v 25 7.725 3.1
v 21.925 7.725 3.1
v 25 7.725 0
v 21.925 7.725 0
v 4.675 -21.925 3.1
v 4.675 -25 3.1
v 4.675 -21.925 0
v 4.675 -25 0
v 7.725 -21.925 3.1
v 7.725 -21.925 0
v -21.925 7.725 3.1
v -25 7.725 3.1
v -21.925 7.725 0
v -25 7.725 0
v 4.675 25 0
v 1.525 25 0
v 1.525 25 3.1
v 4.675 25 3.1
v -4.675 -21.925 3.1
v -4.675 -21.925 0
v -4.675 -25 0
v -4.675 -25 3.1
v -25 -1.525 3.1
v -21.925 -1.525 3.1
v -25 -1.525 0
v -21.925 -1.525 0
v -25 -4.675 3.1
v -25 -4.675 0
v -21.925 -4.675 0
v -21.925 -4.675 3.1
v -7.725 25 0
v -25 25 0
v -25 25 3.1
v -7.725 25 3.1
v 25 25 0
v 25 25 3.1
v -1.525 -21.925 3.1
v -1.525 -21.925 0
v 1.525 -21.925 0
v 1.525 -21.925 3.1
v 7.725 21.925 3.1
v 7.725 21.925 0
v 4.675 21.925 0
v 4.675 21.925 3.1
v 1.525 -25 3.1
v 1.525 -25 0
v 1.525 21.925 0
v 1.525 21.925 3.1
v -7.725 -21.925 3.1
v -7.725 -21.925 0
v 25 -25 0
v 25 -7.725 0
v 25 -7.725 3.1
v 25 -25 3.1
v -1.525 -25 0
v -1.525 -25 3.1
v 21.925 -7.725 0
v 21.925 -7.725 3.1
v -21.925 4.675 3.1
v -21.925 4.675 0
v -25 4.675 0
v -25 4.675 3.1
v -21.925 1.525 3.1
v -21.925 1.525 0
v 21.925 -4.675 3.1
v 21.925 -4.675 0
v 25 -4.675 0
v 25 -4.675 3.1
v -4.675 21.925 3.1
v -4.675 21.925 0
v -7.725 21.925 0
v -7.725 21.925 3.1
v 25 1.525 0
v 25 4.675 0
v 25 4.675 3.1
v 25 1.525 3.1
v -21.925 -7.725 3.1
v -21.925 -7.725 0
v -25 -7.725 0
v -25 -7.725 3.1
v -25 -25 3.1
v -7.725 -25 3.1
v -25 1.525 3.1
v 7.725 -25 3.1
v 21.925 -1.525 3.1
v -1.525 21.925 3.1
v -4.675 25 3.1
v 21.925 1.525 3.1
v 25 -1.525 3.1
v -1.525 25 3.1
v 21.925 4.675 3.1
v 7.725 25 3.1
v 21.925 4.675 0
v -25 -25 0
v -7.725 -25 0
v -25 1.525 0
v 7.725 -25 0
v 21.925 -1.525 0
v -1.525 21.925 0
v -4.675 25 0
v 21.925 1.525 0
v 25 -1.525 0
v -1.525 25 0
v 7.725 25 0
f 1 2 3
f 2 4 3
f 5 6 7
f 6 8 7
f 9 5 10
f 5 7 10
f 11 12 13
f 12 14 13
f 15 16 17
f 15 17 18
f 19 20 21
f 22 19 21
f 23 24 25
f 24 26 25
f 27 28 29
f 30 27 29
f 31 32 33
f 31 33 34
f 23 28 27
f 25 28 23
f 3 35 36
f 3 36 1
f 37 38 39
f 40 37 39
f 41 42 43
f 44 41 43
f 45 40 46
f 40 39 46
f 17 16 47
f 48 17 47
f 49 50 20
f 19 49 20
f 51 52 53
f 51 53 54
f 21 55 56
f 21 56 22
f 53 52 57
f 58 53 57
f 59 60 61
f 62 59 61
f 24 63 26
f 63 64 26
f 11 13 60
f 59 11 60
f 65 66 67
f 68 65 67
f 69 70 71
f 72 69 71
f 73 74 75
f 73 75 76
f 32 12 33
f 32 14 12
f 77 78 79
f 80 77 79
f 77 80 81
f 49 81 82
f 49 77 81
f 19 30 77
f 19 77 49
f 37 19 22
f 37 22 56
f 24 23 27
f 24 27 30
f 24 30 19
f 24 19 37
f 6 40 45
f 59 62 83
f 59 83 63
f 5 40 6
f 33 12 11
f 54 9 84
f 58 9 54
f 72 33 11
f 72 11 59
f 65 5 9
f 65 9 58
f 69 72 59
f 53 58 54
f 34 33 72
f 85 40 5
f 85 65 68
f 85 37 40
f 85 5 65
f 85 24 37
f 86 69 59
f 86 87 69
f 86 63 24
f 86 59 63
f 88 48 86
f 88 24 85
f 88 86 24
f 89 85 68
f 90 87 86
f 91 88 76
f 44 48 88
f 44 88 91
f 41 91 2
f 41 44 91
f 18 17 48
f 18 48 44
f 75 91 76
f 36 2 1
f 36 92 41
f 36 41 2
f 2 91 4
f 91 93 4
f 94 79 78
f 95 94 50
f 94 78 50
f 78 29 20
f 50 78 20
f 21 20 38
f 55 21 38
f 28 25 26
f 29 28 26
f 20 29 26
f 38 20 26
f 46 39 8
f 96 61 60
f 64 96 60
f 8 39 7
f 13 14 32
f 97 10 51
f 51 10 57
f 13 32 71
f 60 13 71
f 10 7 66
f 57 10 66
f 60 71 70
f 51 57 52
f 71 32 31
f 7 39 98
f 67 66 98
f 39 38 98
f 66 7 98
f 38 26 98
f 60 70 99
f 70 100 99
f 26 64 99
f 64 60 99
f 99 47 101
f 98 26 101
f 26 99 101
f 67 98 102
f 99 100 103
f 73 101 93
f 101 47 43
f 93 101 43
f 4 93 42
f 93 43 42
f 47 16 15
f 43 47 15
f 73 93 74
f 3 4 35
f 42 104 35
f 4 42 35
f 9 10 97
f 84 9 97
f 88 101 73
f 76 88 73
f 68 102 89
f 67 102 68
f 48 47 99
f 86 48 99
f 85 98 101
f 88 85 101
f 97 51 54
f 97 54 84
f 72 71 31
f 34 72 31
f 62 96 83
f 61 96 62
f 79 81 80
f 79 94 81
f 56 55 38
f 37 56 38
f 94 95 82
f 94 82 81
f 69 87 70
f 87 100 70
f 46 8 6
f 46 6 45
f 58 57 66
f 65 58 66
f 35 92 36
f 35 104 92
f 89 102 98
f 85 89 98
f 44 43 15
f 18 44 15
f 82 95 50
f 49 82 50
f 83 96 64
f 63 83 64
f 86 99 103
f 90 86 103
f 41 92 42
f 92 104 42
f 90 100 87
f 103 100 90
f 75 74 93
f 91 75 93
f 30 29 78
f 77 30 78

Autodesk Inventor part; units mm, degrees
ref_plane "YZ Plane" through (0, 0, 0) normal (1, 0, 0) x (0, 1, 0)
ref_plane "XZ Plane" through (0, 0, 0) normal (0, 1, 0) x (-1, 0, 0)
ref_plane "XY Plane" through (0, 0, 0) normal (0, 0, 1) x (1, 0, 0)
sketch "slots" plane through (0, 0, 0) normal (0, 0, 1) x (1, 0, 0)
  line L0 (61.2067, 31.1821) -> (64.2567, 31.1821)
  line L1 (64.2567, 31.1821) -> (64.2567, 28.1071)
  line L2 (64.2567, 28.1071) -> (61.2067, 28.1071)
  line L3 (61.2067, 28.1071) -> (61.2067, 31.1821)
  line L4 (68.9317, 33.8834) -> (68.9317, 26.9198) construction
  line L5 (67.4067, 31.1821) -> (70.4567, 31.1821)
  line L6 (70.4567, 31.1821) -> (70.4567, 28.1071)
  line L7 (70.4567, 28.1071) -> (67.4067, 28.1071)
  line L8 (67.4067, 28.1071) -> (67.4067, 31.1821)
  line L9 (73.6067, 31.1821) -> (76.6567, 31.1821)
  line L10 (76.6567, 31.1821) -> (76.6567, 28.1071)
  line L11 (76.6567, 28.1071) -> (73.6067, 28.1071)
  line L12 (73.6067, 28.1071) -> (73.6067, 31.1821)
  line L13 (68.9317, 28.1071) -> (68.9317, 27.1937) construction
  point P0 (68.8645, 30.3856)
  dimension "d2" = 3.05
  dimension "d3" = 3.075
  dimension "d4" = 3.15
  dimension "d5" = 3.15
sketch "Sketch1" plane through (0, 0, 0) normal (0, 0, 1) x (1, 0, 0)
  line L0 (-25, 25) -> (25, 25)
  line L1 (25, 25) -> (25, -25)
  line L2 (25, -25) -> (-25, -25)
  line L3 (-25, -25) -> (-25, 25)
  line L4 (0, 40.2669) -> (0, -57.9846) construction
  line L5 (-45.3823, 0) -> (61.3149, 0) construction
  line L6 (-7.725, 25) -> (-4.675, 25)
  line L7 (-4.675, 25) -> (-4.675, 21.925)
  line L8 (-4.675, 21.925) -> (-7.725, 21.925)
  line L9 (-7.725, 21.925) -> (-7.725, 25)
  line L10 (0, 27.7013) -> (0, 20.7377) construction
  line L11 (-1.525, 25) -> (1.525, 25)
  line L12 (1.525, 25) -> (1.525, 21.925)
  line L13 (1.525, 21.925) -> (-1.525, 21.925)
  line L14 (-1.525, 21.925) -> (-1.525, 25)
  line L15 (4.675, 25) -> (7.725, 25)
  line L16 (7.725, 25) -> (7.725, 21.925)
  line L17 (7.725, 21.925) -> (4.675, 21.925)
  line L18 (4.675, 21.925) -> (4.675, 25)
  line L19 (0, 21.925) -> (0, 21.0116) construction
  line L20 (-7.725, -21.925) -> (-4.675, -21.925)
  line L21 (-4.675, -21.925) -> (-4.675, -25)
  line L22 (-4.675, -25) -> (-7.725, -25)
  line L23 (-7.725, -25) -> (-7.725, -21.925)
  line L24 (0, -19.2237) -> (0, -26.1873) construction
  line L25 (-1.525, -21.925) -> (1.525, -21.925)
  line L26 (1.525, -21.925) -> (1.525, -25)
  line L27 (1.525, -25) -> (-1.525, -25)
  line L28 (-1.525, -25) -> (-1.525, -21.925)
  line L29 (4.675, -21.925) -> (7.725, -21.925)
  line L30 (7.725, -21.925) -> (7.725, -25)
  line L31 (7.725, -25) -> (4.675, -25)
  line L32 (4.675, -25) -> (4.675, -21.925)
  line L33 (0, -25) -> (0, -25.9134) construction
  line L34 (-25, -7.725) -> (-25, -4.675)
  line L35 (-25, -4.675) -> (-21.925, -4.675)
  line L36 (-21.925, -4.675) -> (-21.925, -7.725)
  line L37 (-21.925, -7.725) -> (-25, -7.725)
  line L38 (-27.7013, 0) -> (-20.7377, 0) construction
  line L39 (-25, -1.525) -> (-25, 1.525)
  line L40 (-25, 1.525) -> (-21.925, 1.525)
  line L41 (-21.925, 1.525) -> (-21.925, -1.525)
  line L42 (-21.925, -1.525) -> (-25, -1.525)
  line L43 (-25, 4.675) -> (-25, 7.725)
  line L44 (-25, 7.725) -> (-21.925, 7.725)
  line L45 (-21.925, 7.725) -> (-21.925, 4.675)
  line L46 (-21.925, 4.675) -> (-25, 4.675)
  line L47 (-21.925, 0) -> (-21.0116, 0) construction
  line L48 (21.925, -7.725) -> (21.925, -4.675)
  line L49 (21.925, -4.675) -> (25, -4.675)
  line L50 (25, -4.675) -> (25, -7.725)
  line L51 (25, -7.725) -> (21.925, -7.725)
  line L52 (19.2237, 0) -> (26.1873, 0) construction
  line L53 (21.925, -1.525) -> (21.925, 1.525)
  line L54 (21.925, 1.525) -> (25, 1.525)
  line L55 (25, 1.525) -> (25, -1.525)
  line L56 (25, -1.525) -> (21.925, -1.525)
  line L57 (21.925, 4.675) -> (21.925, 7.725)
  line L58 (21.925, 7.725) -> (25, 7.725)
  line L59 (25, 7.725) -> (25, 4.675)
  line L60 (25, 4.675) -> (21.925, 4.675)
  line L61 (25, 0) -> (25.9134, 0) construction
  point P0 (0, 0)
  point P1 (25, 0)
  point P2 (0, 25)
  dimension "d0" = 50
  dimension "d1" = 50
extrude "Extrusion1" add sketch "Sketch1" along normal blind 3.1 contours L0 L9 L8 L7 L14 L13 L12 L18 L17 L16 L1 L58 L57 L60 L54 L53 L56 L49 L48 L51 L2 L30 L29 L32 L26 L25 L28 L21 L20 L23 L3 L37 L36 L35 L42 L41 L40 L46 L45 L44
equation "\"d2\" = mat - kerf"
equation "\"d3\" = mat - 0.5 * kerf"
equation "\"d4\" = mat + kerf"
equation "\"d5\" = mat + kerf"
equation "\"d8\" = mat"
equation "\"mat\" = 3.1"
equation "\"kerf\" = 0.05"
properties part number "base"
